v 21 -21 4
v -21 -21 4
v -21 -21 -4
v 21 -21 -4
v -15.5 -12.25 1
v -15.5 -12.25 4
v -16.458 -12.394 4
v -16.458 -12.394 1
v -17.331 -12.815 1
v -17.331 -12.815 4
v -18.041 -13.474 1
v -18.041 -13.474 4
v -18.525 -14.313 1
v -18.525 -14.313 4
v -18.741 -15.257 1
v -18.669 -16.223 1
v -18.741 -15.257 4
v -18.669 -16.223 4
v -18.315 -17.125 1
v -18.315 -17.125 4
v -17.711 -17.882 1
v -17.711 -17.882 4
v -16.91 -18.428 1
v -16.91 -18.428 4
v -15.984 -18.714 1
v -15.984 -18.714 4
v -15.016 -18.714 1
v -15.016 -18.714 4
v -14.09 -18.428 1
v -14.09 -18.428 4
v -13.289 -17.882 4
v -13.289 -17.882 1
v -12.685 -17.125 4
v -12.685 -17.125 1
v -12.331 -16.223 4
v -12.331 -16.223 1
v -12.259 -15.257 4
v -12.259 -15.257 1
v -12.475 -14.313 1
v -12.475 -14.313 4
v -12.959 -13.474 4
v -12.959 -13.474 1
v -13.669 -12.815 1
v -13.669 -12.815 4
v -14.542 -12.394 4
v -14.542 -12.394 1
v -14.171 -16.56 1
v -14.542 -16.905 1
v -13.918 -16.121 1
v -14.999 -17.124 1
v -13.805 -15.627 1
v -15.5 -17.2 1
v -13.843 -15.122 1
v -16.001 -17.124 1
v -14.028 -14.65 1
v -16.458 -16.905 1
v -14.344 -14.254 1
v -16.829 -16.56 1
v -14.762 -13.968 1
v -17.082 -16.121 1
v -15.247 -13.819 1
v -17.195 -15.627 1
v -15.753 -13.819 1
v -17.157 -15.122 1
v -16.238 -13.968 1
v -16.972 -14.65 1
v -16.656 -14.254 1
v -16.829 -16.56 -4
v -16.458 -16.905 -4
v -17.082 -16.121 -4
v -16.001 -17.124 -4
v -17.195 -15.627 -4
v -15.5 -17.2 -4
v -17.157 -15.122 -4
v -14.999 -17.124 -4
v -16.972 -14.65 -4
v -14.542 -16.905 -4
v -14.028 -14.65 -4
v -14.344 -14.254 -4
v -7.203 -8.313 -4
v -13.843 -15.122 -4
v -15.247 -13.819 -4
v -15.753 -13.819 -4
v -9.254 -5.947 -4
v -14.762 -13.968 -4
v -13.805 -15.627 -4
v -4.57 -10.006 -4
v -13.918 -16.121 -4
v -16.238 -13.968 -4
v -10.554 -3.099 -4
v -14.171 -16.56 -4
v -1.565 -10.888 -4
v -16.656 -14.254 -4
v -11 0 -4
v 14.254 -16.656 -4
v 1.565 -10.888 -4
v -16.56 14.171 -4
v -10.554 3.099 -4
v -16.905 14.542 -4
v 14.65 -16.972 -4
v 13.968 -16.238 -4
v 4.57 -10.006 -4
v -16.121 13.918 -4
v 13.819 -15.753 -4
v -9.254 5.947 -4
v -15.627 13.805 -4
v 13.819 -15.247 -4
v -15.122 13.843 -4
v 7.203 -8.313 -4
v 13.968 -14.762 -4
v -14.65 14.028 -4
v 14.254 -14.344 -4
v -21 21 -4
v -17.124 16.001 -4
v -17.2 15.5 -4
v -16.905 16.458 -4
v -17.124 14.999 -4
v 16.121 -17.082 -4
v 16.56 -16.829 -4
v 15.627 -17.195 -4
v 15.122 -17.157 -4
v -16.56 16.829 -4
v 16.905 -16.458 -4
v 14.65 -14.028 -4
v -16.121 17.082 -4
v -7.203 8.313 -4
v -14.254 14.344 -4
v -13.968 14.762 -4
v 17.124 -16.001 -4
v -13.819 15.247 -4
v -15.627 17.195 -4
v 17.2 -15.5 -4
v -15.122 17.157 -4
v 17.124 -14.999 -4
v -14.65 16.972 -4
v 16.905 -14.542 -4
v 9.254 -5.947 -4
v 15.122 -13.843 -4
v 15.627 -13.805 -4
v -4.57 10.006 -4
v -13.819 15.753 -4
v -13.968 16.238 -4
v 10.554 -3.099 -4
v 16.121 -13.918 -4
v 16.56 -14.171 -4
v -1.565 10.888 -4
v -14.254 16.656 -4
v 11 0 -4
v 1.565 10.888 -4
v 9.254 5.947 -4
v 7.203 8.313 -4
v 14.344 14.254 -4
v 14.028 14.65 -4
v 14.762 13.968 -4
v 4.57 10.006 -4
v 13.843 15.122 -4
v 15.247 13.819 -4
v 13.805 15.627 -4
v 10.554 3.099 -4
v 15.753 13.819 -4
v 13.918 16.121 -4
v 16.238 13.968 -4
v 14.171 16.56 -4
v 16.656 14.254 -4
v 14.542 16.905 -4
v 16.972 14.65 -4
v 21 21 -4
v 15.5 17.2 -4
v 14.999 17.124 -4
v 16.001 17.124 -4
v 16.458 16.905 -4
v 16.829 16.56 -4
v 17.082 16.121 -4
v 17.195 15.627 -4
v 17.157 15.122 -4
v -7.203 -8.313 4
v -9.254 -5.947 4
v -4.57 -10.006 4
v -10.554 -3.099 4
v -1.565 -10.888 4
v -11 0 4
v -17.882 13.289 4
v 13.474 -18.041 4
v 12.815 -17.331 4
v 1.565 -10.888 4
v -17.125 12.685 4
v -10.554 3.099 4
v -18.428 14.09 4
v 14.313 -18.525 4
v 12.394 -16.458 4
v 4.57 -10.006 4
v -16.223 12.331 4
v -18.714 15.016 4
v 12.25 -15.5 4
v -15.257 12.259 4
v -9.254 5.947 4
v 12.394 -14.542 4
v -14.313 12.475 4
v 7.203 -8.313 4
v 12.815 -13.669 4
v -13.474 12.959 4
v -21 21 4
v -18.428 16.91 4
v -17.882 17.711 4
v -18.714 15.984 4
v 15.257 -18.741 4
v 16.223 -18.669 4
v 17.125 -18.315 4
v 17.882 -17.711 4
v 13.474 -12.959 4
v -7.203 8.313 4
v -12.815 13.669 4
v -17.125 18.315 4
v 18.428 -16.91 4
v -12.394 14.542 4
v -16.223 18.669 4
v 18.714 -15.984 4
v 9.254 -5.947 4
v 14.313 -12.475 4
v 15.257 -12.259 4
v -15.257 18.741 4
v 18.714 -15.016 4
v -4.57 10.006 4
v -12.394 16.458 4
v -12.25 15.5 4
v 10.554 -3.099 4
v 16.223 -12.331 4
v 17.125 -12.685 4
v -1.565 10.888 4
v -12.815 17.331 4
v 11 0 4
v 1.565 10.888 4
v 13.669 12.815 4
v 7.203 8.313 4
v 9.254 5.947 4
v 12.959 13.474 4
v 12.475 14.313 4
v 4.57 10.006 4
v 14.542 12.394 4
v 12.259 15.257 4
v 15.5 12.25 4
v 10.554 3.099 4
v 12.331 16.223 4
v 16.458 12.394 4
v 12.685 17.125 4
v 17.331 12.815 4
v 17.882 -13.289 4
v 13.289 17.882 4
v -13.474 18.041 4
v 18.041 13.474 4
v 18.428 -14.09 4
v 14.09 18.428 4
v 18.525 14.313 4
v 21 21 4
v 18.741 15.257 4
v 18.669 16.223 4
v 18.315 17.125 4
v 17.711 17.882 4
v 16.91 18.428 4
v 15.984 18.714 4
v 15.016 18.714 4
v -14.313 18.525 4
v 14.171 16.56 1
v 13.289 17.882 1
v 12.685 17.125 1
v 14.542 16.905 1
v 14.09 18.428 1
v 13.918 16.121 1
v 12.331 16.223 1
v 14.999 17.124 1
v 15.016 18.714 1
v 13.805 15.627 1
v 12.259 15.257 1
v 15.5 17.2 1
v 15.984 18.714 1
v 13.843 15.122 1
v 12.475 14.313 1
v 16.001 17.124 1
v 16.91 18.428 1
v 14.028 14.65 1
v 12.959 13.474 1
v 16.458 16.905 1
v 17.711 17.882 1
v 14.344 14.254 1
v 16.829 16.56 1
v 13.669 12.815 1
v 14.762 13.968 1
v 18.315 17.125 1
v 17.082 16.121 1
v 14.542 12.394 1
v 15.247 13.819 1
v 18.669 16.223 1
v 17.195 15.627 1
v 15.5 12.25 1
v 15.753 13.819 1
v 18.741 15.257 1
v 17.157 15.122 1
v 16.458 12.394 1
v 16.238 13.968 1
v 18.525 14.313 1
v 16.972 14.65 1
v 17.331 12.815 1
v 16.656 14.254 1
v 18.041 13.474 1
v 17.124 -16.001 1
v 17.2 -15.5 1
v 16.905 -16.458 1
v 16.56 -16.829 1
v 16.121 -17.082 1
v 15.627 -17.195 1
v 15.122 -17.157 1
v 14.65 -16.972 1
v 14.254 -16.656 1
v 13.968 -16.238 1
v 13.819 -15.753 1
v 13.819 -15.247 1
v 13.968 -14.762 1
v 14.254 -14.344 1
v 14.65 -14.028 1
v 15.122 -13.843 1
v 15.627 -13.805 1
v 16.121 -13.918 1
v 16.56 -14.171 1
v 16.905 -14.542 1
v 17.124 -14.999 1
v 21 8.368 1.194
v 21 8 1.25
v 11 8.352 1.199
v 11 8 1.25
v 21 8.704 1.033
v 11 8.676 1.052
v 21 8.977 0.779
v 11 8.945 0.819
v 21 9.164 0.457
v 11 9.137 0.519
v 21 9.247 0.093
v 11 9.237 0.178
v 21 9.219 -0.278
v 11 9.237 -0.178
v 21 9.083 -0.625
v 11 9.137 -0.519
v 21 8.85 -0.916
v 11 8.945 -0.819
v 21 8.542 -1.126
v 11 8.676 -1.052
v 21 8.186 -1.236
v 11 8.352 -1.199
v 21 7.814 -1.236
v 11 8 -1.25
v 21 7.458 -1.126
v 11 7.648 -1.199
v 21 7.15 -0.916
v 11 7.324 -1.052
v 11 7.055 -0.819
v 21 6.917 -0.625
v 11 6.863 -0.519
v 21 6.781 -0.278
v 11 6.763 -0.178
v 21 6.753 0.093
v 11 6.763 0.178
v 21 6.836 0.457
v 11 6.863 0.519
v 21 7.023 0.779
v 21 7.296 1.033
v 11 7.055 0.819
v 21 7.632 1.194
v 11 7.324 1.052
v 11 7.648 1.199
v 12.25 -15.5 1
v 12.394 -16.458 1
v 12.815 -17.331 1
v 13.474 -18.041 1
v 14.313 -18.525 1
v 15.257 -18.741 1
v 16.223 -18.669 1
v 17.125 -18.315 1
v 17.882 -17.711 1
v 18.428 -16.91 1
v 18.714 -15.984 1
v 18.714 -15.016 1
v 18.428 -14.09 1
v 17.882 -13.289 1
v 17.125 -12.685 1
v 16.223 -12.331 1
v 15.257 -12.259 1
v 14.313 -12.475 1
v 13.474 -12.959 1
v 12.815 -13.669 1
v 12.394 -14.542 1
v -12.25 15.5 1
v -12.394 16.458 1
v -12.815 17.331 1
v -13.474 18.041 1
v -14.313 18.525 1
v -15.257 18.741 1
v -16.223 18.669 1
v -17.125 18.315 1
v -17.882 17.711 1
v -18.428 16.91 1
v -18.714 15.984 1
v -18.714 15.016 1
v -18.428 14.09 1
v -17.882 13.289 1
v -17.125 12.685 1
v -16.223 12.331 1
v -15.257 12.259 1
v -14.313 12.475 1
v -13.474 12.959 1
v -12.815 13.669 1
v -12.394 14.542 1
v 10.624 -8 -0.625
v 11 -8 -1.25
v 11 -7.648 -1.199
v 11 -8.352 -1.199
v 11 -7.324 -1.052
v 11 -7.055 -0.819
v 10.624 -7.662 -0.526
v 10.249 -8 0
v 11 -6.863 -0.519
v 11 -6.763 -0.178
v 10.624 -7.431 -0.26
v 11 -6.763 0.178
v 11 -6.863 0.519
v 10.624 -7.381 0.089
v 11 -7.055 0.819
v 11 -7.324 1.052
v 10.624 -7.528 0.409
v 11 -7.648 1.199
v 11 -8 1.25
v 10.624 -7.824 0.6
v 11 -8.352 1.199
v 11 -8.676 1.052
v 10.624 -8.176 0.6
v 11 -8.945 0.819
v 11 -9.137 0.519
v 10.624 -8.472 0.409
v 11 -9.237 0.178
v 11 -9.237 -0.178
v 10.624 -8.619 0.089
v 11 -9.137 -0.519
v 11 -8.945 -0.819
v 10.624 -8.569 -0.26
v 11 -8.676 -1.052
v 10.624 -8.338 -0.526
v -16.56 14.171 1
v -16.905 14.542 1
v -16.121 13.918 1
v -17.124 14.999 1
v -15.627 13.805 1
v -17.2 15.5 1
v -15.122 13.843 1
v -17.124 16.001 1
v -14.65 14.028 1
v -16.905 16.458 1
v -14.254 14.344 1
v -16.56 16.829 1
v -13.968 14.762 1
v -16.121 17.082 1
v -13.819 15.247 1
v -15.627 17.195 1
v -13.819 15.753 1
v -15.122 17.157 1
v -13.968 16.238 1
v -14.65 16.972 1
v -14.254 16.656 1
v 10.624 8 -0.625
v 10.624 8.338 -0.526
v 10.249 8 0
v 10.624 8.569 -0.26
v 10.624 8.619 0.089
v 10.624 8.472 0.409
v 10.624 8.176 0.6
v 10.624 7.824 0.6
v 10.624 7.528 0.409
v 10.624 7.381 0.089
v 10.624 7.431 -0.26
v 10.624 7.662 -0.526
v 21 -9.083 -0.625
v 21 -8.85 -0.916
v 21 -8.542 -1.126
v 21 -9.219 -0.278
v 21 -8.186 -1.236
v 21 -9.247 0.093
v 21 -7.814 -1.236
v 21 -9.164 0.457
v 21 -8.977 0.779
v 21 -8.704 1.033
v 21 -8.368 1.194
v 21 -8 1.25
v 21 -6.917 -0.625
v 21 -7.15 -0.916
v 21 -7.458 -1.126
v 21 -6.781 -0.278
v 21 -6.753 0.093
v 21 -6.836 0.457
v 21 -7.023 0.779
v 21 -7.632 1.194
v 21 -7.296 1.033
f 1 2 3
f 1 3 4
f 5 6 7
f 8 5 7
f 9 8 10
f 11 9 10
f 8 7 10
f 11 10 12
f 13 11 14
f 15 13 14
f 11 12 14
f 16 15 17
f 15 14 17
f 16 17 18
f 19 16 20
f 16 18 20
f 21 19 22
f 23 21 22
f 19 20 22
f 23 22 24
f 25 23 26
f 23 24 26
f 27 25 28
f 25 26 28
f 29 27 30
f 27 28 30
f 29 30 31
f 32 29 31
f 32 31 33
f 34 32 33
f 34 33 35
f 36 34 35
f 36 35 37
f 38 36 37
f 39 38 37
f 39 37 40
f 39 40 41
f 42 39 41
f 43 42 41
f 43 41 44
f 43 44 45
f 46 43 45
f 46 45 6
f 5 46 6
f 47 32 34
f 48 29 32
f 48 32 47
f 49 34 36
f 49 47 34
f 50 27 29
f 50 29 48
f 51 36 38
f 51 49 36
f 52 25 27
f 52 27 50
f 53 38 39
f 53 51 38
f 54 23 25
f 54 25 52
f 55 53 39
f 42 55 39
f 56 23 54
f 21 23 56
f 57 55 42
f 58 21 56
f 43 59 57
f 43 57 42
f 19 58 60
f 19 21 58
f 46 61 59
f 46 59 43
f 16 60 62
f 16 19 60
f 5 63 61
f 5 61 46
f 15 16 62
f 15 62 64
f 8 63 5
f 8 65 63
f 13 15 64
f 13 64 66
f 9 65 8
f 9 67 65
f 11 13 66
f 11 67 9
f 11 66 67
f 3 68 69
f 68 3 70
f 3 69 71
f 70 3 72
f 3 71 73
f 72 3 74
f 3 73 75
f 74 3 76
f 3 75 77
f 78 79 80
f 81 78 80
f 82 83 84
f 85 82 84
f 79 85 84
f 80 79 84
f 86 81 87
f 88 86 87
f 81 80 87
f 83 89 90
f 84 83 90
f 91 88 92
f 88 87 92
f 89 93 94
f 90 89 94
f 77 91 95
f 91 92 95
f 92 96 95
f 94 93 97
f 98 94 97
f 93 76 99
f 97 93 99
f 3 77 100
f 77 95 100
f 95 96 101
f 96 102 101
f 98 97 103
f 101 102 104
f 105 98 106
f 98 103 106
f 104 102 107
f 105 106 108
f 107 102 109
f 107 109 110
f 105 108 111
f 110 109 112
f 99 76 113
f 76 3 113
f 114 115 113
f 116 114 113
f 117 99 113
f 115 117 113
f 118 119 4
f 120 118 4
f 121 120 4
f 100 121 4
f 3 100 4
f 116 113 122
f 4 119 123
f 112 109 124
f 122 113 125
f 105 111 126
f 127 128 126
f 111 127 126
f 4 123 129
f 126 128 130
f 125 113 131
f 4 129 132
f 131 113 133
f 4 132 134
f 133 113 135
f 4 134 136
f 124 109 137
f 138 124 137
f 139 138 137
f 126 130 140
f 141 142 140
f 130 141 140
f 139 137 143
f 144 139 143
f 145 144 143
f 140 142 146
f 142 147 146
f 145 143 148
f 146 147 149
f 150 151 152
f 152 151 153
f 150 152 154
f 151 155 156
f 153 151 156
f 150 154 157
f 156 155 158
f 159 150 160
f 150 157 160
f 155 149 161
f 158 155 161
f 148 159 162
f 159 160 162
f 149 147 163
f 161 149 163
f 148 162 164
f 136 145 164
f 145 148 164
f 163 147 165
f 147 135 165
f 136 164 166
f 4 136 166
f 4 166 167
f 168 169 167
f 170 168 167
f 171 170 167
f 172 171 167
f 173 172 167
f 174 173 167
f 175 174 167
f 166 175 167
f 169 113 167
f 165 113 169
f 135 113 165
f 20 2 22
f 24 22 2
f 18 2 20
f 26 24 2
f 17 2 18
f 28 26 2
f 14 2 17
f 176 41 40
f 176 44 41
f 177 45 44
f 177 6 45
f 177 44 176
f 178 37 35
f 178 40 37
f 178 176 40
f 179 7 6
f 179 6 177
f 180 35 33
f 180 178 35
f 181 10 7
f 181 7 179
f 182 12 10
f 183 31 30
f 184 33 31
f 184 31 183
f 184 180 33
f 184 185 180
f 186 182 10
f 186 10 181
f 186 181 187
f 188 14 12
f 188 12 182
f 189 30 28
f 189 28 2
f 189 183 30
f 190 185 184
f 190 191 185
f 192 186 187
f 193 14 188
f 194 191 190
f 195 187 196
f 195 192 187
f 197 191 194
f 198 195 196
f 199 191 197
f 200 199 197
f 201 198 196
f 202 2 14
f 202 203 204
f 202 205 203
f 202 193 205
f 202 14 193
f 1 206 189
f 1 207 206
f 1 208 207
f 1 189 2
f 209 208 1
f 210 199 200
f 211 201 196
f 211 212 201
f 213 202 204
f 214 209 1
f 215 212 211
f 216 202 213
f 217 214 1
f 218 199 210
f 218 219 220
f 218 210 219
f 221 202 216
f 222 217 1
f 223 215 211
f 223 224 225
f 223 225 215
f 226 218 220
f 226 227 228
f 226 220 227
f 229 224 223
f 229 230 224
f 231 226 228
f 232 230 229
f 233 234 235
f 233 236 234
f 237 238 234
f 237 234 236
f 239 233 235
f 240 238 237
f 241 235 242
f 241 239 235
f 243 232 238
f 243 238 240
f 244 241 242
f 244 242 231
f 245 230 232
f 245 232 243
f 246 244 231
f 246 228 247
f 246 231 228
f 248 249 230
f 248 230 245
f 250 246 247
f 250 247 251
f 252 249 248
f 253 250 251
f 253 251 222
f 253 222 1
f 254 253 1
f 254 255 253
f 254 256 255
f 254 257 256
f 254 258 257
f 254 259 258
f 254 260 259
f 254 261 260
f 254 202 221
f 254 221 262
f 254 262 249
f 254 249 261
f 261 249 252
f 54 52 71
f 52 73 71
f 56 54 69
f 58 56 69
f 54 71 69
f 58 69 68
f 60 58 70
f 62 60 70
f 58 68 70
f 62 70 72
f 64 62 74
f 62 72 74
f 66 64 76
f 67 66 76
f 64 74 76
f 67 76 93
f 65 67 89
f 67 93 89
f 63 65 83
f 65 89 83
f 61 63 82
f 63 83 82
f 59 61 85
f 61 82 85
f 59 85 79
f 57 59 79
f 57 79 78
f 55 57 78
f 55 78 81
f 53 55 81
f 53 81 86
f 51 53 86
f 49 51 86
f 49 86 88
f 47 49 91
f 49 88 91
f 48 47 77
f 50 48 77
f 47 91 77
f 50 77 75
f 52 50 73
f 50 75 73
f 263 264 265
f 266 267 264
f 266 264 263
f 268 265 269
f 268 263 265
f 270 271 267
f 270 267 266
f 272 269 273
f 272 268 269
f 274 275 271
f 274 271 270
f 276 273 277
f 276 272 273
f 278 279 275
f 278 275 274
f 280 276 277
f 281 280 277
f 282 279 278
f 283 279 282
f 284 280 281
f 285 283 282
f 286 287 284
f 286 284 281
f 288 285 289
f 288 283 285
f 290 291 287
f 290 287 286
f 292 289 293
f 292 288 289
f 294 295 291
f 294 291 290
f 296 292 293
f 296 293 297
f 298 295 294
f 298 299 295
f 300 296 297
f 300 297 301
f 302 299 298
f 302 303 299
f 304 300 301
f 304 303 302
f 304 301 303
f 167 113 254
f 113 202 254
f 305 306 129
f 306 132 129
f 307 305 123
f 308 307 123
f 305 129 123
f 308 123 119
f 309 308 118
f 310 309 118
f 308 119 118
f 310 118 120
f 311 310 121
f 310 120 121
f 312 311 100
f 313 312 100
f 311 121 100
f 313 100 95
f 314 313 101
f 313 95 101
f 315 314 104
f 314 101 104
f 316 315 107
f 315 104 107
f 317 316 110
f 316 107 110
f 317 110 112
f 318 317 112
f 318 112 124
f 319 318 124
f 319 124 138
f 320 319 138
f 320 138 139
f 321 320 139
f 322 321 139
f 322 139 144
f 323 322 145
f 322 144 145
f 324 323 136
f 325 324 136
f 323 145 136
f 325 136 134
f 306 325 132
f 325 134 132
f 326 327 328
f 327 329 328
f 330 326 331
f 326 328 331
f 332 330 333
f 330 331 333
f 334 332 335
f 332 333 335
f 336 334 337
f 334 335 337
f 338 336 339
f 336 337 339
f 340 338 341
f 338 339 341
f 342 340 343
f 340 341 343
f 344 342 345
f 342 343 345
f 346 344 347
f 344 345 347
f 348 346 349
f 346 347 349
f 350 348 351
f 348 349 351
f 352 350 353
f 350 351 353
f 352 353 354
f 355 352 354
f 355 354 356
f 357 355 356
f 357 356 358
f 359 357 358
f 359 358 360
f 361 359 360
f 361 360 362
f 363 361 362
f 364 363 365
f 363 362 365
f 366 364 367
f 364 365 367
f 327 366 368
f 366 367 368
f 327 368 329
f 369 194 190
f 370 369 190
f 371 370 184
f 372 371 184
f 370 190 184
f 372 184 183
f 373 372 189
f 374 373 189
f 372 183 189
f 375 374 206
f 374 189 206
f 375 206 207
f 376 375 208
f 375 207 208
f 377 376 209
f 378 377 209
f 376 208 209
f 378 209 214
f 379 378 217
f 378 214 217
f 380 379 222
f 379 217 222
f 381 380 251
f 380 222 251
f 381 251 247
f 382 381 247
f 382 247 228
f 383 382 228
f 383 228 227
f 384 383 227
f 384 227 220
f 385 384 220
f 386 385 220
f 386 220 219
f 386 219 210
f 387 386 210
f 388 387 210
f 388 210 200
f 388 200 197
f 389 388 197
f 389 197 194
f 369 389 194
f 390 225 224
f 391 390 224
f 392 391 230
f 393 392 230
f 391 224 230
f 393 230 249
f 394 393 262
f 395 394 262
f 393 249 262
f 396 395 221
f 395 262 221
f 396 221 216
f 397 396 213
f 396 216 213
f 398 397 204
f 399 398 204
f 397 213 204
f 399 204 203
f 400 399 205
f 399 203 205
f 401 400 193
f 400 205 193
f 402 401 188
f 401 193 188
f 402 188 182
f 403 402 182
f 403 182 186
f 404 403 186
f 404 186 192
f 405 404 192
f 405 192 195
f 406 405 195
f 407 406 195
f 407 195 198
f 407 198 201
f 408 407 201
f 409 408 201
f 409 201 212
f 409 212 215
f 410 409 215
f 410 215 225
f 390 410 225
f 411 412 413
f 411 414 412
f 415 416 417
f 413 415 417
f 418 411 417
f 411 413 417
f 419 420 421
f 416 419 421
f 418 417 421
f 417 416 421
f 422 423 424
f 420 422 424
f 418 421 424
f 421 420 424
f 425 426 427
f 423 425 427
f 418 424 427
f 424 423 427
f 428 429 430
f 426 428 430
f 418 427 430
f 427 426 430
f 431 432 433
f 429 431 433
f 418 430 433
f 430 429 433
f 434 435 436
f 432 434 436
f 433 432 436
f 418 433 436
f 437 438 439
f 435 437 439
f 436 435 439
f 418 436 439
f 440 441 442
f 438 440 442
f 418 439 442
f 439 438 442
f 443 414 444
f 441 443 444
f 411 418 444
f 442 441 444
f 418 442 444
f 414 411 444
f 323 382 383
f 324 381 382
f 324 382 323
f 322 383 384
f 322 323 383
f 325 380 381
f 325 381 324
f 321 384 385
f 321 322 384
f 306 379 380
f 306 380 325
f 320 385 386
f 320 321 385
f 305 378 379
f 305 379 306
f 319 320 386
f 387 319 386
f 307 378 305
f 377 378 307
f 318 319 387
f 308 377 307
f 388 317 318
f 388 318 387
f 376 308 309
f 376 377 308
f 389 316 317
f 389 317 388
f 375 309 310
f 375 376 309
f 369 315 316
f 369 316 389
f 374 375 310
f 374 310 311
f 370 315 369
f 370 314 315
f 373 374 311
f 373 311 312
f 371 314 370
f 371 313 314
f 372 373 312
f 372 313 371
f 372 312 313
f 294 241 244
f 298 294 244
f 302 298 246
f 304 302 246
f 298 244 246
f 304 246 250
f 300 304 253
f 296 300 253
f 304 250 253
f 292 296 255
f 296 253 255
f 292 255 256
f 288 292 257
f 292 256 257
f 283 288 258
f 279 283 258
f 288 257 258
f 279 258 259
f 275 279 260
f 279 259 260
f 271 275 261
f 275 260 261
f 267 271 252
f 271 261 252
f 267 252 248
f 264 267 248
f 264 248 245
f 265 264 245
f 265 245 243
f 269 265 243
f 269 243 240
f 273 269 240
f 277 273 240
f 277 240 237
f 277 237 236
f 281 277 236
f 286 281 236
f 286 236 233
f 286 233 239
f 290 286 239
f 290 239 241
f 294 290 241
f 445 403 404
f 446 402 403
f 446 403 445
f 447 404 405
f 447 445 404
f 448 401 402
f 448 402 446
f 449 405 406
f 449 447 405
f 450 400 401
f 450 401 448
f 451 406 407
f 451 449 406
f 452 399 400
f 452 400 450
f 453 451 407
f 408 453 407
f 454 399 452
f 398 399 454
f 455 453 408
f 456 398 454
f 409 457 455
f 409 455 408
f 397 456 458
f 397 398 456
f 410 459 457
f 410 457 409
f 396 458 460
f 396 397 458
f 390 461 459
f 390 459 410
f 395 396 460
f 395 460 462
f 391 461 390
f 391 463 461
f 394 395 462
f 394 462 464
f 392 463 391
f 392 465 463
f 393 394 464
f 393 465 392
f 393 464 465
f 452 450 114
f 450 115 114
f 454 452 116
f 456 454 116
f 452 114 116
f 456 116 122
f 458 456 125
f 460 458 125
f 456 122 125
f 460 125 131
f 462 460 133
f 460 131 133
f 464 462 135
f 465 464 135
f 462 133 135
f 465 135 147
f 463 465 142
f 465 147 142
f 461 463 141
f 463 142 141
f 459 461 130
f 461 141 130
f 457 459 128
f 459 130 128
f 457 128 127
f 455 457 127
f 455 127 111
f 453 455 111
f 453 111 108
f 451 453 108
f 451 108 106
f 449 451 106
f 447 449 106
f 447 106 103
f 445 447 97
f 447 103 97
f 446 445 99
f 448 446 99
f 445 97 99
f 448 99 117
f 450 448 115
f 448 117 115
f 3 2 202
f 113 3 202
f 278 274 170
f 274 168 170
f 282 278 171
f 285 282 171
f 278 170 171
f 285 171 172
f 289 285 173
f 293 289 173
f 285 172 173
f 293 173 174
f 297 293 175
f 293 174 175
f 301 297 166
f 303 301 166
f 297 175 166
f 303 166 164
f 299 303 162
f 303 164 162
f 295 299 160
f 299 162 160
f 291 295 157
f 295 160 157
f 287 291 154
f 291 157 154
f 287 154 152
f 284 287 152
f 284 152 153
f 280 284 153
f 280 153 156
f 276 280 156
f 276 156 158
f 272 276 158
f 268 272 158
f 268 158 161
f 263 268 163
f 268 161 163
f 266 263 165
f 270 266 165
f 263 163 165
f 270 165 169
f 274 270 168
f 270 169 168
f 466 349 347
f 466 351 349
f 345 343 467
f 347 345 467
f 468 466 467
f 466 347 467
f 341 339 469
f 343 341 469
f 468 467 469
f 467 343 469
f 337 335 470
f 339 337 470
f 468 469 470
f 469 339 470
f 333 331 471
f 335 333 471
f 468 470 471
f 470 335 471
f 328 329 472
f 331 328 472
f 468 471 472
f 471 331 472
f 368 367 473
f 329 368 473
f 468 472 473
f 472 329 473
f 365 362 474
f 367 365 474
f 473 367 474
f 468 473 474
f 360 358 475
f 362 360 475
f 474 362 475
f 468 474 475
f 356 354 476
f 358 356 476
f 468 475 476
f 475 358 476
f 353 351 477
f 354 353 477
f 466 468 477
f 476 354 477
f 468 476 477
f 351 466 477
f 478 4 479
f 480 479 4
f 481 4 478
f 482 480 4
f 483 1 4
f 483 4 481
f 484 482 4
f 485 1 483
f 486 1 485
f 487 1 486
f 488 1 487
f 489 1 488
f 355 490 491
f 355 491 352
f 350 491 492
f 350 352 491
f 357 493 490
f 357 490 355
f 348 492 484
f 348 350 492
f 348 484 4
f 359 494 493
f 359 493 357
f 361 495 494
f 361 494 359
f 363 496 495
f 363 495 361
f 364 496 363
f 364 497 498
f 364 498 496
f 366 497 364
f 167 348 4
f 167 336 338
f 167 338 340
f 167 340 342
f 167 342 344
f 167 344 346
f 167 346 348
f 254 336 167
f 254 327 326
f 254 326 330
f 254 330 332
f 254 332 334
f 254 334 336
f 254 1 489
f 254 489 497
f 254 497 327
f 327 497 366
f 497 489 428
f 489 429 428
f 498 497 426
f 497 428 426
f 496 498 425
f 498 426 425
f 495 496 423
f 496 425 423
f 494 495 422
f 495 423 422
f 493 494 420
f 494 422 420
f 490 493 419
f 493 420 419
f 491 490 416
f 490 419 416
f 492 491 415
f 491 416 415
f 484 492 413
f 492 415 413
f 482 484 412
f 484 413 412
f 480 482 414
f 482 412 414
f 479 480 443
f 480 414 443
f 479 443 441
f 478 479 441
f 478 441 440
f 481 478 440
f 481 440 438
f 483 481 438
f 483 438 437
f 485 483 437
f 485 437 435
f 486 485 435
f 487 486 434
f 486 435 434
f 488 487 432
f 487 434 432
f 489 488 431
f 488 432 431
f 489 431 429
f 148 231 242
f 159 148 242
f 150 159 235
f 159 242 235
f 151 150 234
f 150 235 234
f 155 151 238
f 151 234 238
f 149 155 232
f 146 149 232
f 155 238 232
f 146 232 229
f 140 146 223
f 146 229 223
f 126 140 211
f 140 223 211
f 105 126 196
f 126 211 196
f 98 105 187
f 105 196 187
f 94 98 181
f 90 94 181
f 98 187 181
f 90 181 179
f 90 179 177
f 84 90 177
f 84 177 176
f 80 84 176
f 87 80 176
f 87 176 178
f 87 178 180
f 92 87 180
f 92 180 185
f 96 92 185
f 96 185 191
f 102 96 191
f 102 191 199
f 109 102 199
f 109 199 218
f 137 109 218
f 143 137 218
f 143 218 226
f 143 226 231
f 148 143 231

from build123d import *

# Parameters (mm, degrees)
SKETCH_1_W                   = 42
SKETCH_1_H                   = 42
EXTRUDE_1_DEPTH              = 4
SKETCH_2_R                   = 11
CUT_EXTRUDE_1_DEPTH          = 31.757112998
HOLE_WIZARD_M3_1_D           = 3.4
HOLE_WIZARD_M3_1_CBORE_D     = 6.5
HOLE_WIZARD_M3_1_CBORE_DEPTH = 3
PATTERN_CIRCULAR_1_COUNT     = 4
M3X0_5_1_D                   = 2.5
M3X0_5_1_DEPTH               = 10
M3X0_5_1_TIP                 = 0.751075774


with BuildPart() as part:
    # 草圖1 → 填料-伸長1 (new, symmetric)
    with BuildSketch(Plane.XY):
        Rectangle(SKETCH_1_W, SKETCH_1_H)
    extrude(amount=EXTRUDE_1_DEPTH, both=True)

    # 草圖2 → 除料-伸長1 (cut, through all)
    with BuildSketch(Plane.XY.offset(4)):
        Circle(SKETCH_2_R)
    extrude(amount=-CUT_EXTRUDE_1_DEPTH, mode=Mode.SUBTRACT)

    # M3 凹頭蓋螺釘的柱孔1 (through all)
    with Locations(Plane.XY.offset(4)):
        with Locations((-15.5, 15.5)):
            hole_wizard_m3_1 = CounterBoreHole(HOLE_WIZARD_M3_1_D / 2, HOLE_WIZARD_M3_1_CBORE_D / 2, HOLE_WIZARD_M3_1_CBORE_DEPTH)

    # 環狀複製排列1: M3 凹頭蓋螺釘的柱孔1 ×4 about axis
    pattern_circular_1_axis = Axis((0, 0, 0), (0, 0, 1))
    for i in range(1, PATTERN_CIRCULAR_1_COUNT):
        add(hole_wizard_m3_1.rotate(pattern_circular_1_axis, i * 360 / PATTERN_CIRCULAR_1_COUNT), mode=Mode.SUBTRACT)

    # M3x0.5 螺紋孔1
    with Locations(Plane(origin=(21, 0, 0), x_dir=(0, 0, -1), z_dir=(1, 0, 0))):
        with Locations((0, 8), (0, -8)):
            Hole(M3X0_5_1_D / 2, depth=M3X0_5_1_DEPTH)
            with Locations((0, 0, -(M3X0_5_1_DEPTH + M3X0_5_1_TIP / 2))):  # 118° drill point
                Cone(0, M3X0_5_1_D / 2, M3X0_5_1_TIP, mode=Mode.SUBTRACT)


solid = part.part
